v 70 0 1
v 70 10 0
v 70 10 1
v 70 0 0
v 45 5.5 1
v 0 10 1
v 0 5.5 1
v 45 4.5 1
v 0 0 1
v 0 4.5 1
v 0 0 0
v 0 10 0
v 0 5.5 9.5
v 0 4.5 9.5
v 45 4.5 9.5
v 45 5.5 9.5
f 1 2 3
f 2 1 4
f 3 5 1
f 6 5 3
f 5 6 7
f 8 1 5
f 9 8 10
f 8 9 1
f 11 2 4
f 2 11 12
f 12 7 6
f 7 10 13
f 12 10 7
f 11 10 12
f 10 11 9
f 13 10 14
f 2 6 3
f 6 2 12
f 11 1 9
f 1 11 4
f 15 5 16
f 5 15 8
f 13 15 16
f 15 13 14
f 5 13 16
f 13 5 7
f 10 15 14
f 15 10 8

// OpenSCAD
module endstop(length, tablen, width, h)
{
	tabw = 1;
	cube(size=[length, width, 1]);
	translate([0,(width-tabw)/2,0])
		cube(size=[tablen,tabw,h]);
}

endstop(70, 45, 10, 9.5);
